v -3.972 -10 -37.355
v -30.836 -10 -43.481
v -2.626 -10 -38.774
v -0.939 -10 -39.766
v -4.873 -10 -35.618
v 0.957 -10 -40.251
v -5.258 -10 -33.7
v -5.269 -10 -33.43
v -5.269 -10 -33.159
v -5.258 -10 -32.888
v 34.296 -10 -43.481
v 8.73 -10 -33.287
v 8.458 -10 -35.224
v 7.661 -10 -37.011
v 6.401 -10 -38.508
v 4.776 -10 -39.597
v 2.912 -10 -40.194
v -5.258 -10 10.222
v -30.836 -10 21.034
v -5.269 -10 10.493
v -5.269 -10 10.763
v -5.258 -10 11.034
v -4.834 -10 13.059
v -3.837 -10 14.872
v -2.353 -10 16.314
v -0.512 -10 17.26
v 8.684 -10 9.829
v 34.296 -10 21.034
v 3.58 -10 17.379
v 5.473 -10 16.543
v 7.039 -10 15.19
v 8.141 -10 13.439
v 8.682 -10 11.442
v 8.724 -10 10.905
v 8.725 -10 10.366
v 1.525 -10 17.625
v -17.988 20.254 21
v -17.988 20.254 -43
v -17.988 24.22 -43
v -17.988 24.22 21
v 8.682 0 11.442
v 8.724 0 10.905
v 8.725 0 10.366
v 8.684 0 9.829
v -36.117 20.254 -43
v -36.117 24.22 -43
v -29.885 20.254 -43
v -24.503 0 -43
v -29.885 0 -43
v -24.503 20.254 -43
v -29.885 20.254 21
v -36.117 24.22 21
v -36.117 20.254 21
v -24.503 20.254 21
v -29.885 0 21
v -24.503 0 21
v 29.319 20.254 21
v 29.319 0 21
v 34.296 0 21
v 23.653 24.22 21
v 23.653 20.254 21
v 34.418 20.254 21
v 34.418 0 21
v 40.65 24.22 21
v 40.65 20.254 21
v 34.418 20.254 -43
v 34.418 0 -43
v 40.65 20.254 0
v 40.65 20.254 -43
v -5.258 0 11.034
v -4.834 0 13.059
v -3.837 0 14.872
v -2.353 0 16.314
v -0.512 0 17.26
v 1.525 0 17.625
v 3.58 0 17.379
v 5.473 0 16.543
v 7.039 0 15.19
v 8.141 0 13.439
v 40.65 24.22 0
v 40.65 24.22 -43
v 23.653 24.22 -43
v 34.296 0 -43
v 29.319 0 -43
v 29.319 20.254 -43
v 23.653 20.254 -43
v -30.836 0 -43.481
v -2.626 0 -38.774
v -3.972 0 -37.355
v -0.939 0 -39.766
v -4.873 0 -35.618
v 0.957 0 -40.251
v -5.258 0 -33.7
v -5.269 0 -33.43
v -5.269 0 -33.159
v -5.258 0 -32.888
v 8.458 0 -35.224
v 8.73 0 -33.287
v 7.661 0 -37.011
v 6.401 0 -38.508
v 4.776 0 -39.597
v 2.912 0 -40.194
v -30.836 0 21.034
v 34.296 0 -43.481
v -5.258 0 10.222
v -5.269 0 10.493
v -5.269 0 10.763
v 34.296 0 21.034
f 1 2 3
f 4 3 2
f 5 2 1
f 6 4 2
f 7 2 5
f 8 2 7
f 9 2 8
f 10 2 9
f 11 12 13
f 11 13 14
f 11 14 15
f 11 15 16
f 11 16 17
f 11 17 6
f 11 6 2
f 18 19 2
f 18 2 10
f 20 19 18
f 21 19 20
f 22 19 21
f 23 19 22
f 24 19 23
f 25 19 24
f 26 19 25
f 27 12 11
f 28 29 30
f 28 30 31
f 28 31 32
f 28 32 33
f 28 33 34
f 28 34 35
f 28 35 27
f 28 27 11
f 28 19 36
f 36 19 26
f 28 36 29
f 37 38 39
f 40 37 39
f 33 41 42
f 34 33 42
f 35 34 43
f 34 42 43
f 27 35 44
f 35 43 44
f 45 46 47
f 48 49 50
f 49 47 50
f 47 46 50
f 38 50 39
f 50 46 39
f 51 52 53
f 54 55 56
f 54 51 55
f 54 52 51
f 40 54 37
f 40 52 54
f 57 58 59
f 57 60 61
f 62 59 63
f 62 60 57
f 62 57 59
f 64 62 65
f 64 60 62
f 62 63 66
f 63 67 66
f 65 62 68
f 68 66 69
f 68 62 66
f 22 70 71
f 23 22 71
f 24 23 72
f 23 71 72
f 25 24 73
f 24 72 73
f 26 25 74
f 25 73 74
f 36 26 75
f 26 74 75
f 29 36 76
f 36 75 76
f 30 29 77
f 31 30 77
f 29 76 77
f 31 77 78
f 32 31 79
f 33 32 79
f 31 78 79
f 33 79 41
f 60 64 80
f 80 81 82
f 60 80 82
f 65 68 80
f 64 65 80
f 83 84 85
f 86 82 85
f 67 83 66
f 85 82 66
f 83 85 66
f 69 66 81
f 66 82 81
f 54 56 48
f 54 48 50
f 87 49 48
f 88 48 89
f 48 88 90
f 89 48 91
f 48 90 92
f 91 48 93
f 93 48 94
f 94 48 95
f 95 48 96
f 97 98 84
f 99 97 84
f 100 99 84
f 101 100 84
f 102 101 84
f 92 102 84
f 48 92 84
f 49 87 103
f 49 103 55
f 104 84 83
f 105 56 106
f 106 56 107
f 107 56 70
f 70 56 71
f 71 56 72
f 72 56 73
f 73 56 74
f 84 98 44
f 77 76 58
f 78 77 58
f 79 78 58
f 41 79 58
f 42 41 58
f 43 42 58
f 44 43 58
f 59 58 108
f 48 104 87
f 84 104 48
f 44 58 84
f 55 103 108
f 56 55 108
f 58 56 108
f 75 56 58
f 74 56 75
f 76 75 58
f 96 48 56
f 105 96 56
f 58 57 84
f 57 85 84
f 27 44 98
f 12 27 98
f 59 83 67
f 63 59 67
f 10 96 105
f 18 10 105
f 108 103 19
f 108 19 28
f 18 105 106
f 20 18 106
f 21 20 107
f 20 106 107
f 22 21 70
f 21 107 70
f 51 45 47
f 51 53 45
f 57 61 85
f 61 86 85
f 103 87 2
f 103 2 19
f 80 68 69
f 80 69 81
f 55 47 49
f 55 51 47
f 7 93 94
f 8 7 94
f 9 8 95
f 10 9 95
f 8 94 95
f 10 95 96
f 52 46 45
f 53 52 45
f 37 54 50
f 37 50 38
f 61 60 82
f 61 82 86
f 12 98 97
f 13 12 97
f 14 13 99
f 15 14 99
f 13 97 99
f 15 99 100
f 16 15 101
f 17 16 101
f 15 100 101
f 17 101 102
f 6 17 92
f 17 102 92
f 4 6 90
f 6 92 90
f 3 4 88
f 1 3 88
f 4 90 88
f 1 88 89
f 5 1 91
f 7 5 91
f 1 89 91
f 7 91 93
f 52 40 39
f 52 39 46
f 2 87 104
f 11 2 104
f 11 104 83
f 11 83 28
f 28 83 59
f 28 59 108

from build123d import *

# Parameters (mm, degrees)
F0_W     = 65.131832
F0_H     = 64.514473
F1_DEPTH = 10
F3_DEPTH = 43
F4_DEPTH = 21


with BuildPart() as f1:
    # F0 (on Front) → F1 (new body)
    with BuildSketch(Plane.XZ):
        with Locations((1.729728, -11.223505)):
            Rectangle(F0_W, F0_H)
        with BuildLine():
            ThreePointArc((8.682307, 11.441543), (8.729724, 10.635549), (8.684016, 9.829457))
            Line((8.684016, 9.829457), (8.729724, -33.286821))
            ThreePointArc((8.729724, -33.286821), (1.936423, -40.29119), (-5.258499, -33.700043))
            ThreePointArc((-5.258499, -33.700043), (-5.270272, -33.294242), (-5.258499, -32.888441))
            Line((-5.258499, -32.888441), (-5.258499, 10.222327))
            ThreePointArc((-5.258499, 10.222327), (-5.270272, 10.628129), (-5.258499, 11.03393))
            ThreePointArc((-5.258499, 11.03393), (1.525143, 17.625138), (8.682307, 11.441543))
        make_face(mode=Mode.SUBTRACT)
    extrude(amount=F1_DEPTH)

    # F2 (on Top) → F3 (join)
    with BuildSketch(Plane.XY):
        Polygon((-29.885342, 0), (-24.503149, 0), (-24.503149, 20.254048), (-17.98786, 20.254048), (-17.98786, 24.219874), (-36.117356, 24.219874), (-36.117356, 20.254048), (-29.885342, 20.254048), align=None)
        Polygon((29.318795, 0), (34.417719, 0), (34.417719, 20.254048), (40.649734, 20.254048), (40.649734, 24.219874), (23.653327, 24.219874), (23.653327, 20.254048), (29.318795, 20.254048), align=None)
    extrude(amount=-F3_DEPTH)

    # F3_face (on face) → F4 (join)
    with BuildSketch(Plane(origin=(31.980128, 14.909508, 0), x_dir=(1, 0, 0), z_dir=(0, 0, 1))):
        Polygon((-2.661333, -14.909508), (2.315516, -14.909508), (2.437591, -14.909508), (2.437591, 5.34454), (8.669607, 5.34454), (8.669607, 9.310366), (-8.326801, 9.310366), (-8.326801, 5.34454), (-2.661333, 5.34454), align=None)
        Polygon((-61.86547, -14.909508), (-56.483277, -14.909508), (-56.483277, 5.34454), (-49.967988, 5.34454), (-49.967988, 9.310366), (-68.097484, 9.310366), (-68.097484, 5.34454), (-61.86547, 5.34454), align=None)
    extrude(amount=F4_DEPTH)


solid = f1.part
